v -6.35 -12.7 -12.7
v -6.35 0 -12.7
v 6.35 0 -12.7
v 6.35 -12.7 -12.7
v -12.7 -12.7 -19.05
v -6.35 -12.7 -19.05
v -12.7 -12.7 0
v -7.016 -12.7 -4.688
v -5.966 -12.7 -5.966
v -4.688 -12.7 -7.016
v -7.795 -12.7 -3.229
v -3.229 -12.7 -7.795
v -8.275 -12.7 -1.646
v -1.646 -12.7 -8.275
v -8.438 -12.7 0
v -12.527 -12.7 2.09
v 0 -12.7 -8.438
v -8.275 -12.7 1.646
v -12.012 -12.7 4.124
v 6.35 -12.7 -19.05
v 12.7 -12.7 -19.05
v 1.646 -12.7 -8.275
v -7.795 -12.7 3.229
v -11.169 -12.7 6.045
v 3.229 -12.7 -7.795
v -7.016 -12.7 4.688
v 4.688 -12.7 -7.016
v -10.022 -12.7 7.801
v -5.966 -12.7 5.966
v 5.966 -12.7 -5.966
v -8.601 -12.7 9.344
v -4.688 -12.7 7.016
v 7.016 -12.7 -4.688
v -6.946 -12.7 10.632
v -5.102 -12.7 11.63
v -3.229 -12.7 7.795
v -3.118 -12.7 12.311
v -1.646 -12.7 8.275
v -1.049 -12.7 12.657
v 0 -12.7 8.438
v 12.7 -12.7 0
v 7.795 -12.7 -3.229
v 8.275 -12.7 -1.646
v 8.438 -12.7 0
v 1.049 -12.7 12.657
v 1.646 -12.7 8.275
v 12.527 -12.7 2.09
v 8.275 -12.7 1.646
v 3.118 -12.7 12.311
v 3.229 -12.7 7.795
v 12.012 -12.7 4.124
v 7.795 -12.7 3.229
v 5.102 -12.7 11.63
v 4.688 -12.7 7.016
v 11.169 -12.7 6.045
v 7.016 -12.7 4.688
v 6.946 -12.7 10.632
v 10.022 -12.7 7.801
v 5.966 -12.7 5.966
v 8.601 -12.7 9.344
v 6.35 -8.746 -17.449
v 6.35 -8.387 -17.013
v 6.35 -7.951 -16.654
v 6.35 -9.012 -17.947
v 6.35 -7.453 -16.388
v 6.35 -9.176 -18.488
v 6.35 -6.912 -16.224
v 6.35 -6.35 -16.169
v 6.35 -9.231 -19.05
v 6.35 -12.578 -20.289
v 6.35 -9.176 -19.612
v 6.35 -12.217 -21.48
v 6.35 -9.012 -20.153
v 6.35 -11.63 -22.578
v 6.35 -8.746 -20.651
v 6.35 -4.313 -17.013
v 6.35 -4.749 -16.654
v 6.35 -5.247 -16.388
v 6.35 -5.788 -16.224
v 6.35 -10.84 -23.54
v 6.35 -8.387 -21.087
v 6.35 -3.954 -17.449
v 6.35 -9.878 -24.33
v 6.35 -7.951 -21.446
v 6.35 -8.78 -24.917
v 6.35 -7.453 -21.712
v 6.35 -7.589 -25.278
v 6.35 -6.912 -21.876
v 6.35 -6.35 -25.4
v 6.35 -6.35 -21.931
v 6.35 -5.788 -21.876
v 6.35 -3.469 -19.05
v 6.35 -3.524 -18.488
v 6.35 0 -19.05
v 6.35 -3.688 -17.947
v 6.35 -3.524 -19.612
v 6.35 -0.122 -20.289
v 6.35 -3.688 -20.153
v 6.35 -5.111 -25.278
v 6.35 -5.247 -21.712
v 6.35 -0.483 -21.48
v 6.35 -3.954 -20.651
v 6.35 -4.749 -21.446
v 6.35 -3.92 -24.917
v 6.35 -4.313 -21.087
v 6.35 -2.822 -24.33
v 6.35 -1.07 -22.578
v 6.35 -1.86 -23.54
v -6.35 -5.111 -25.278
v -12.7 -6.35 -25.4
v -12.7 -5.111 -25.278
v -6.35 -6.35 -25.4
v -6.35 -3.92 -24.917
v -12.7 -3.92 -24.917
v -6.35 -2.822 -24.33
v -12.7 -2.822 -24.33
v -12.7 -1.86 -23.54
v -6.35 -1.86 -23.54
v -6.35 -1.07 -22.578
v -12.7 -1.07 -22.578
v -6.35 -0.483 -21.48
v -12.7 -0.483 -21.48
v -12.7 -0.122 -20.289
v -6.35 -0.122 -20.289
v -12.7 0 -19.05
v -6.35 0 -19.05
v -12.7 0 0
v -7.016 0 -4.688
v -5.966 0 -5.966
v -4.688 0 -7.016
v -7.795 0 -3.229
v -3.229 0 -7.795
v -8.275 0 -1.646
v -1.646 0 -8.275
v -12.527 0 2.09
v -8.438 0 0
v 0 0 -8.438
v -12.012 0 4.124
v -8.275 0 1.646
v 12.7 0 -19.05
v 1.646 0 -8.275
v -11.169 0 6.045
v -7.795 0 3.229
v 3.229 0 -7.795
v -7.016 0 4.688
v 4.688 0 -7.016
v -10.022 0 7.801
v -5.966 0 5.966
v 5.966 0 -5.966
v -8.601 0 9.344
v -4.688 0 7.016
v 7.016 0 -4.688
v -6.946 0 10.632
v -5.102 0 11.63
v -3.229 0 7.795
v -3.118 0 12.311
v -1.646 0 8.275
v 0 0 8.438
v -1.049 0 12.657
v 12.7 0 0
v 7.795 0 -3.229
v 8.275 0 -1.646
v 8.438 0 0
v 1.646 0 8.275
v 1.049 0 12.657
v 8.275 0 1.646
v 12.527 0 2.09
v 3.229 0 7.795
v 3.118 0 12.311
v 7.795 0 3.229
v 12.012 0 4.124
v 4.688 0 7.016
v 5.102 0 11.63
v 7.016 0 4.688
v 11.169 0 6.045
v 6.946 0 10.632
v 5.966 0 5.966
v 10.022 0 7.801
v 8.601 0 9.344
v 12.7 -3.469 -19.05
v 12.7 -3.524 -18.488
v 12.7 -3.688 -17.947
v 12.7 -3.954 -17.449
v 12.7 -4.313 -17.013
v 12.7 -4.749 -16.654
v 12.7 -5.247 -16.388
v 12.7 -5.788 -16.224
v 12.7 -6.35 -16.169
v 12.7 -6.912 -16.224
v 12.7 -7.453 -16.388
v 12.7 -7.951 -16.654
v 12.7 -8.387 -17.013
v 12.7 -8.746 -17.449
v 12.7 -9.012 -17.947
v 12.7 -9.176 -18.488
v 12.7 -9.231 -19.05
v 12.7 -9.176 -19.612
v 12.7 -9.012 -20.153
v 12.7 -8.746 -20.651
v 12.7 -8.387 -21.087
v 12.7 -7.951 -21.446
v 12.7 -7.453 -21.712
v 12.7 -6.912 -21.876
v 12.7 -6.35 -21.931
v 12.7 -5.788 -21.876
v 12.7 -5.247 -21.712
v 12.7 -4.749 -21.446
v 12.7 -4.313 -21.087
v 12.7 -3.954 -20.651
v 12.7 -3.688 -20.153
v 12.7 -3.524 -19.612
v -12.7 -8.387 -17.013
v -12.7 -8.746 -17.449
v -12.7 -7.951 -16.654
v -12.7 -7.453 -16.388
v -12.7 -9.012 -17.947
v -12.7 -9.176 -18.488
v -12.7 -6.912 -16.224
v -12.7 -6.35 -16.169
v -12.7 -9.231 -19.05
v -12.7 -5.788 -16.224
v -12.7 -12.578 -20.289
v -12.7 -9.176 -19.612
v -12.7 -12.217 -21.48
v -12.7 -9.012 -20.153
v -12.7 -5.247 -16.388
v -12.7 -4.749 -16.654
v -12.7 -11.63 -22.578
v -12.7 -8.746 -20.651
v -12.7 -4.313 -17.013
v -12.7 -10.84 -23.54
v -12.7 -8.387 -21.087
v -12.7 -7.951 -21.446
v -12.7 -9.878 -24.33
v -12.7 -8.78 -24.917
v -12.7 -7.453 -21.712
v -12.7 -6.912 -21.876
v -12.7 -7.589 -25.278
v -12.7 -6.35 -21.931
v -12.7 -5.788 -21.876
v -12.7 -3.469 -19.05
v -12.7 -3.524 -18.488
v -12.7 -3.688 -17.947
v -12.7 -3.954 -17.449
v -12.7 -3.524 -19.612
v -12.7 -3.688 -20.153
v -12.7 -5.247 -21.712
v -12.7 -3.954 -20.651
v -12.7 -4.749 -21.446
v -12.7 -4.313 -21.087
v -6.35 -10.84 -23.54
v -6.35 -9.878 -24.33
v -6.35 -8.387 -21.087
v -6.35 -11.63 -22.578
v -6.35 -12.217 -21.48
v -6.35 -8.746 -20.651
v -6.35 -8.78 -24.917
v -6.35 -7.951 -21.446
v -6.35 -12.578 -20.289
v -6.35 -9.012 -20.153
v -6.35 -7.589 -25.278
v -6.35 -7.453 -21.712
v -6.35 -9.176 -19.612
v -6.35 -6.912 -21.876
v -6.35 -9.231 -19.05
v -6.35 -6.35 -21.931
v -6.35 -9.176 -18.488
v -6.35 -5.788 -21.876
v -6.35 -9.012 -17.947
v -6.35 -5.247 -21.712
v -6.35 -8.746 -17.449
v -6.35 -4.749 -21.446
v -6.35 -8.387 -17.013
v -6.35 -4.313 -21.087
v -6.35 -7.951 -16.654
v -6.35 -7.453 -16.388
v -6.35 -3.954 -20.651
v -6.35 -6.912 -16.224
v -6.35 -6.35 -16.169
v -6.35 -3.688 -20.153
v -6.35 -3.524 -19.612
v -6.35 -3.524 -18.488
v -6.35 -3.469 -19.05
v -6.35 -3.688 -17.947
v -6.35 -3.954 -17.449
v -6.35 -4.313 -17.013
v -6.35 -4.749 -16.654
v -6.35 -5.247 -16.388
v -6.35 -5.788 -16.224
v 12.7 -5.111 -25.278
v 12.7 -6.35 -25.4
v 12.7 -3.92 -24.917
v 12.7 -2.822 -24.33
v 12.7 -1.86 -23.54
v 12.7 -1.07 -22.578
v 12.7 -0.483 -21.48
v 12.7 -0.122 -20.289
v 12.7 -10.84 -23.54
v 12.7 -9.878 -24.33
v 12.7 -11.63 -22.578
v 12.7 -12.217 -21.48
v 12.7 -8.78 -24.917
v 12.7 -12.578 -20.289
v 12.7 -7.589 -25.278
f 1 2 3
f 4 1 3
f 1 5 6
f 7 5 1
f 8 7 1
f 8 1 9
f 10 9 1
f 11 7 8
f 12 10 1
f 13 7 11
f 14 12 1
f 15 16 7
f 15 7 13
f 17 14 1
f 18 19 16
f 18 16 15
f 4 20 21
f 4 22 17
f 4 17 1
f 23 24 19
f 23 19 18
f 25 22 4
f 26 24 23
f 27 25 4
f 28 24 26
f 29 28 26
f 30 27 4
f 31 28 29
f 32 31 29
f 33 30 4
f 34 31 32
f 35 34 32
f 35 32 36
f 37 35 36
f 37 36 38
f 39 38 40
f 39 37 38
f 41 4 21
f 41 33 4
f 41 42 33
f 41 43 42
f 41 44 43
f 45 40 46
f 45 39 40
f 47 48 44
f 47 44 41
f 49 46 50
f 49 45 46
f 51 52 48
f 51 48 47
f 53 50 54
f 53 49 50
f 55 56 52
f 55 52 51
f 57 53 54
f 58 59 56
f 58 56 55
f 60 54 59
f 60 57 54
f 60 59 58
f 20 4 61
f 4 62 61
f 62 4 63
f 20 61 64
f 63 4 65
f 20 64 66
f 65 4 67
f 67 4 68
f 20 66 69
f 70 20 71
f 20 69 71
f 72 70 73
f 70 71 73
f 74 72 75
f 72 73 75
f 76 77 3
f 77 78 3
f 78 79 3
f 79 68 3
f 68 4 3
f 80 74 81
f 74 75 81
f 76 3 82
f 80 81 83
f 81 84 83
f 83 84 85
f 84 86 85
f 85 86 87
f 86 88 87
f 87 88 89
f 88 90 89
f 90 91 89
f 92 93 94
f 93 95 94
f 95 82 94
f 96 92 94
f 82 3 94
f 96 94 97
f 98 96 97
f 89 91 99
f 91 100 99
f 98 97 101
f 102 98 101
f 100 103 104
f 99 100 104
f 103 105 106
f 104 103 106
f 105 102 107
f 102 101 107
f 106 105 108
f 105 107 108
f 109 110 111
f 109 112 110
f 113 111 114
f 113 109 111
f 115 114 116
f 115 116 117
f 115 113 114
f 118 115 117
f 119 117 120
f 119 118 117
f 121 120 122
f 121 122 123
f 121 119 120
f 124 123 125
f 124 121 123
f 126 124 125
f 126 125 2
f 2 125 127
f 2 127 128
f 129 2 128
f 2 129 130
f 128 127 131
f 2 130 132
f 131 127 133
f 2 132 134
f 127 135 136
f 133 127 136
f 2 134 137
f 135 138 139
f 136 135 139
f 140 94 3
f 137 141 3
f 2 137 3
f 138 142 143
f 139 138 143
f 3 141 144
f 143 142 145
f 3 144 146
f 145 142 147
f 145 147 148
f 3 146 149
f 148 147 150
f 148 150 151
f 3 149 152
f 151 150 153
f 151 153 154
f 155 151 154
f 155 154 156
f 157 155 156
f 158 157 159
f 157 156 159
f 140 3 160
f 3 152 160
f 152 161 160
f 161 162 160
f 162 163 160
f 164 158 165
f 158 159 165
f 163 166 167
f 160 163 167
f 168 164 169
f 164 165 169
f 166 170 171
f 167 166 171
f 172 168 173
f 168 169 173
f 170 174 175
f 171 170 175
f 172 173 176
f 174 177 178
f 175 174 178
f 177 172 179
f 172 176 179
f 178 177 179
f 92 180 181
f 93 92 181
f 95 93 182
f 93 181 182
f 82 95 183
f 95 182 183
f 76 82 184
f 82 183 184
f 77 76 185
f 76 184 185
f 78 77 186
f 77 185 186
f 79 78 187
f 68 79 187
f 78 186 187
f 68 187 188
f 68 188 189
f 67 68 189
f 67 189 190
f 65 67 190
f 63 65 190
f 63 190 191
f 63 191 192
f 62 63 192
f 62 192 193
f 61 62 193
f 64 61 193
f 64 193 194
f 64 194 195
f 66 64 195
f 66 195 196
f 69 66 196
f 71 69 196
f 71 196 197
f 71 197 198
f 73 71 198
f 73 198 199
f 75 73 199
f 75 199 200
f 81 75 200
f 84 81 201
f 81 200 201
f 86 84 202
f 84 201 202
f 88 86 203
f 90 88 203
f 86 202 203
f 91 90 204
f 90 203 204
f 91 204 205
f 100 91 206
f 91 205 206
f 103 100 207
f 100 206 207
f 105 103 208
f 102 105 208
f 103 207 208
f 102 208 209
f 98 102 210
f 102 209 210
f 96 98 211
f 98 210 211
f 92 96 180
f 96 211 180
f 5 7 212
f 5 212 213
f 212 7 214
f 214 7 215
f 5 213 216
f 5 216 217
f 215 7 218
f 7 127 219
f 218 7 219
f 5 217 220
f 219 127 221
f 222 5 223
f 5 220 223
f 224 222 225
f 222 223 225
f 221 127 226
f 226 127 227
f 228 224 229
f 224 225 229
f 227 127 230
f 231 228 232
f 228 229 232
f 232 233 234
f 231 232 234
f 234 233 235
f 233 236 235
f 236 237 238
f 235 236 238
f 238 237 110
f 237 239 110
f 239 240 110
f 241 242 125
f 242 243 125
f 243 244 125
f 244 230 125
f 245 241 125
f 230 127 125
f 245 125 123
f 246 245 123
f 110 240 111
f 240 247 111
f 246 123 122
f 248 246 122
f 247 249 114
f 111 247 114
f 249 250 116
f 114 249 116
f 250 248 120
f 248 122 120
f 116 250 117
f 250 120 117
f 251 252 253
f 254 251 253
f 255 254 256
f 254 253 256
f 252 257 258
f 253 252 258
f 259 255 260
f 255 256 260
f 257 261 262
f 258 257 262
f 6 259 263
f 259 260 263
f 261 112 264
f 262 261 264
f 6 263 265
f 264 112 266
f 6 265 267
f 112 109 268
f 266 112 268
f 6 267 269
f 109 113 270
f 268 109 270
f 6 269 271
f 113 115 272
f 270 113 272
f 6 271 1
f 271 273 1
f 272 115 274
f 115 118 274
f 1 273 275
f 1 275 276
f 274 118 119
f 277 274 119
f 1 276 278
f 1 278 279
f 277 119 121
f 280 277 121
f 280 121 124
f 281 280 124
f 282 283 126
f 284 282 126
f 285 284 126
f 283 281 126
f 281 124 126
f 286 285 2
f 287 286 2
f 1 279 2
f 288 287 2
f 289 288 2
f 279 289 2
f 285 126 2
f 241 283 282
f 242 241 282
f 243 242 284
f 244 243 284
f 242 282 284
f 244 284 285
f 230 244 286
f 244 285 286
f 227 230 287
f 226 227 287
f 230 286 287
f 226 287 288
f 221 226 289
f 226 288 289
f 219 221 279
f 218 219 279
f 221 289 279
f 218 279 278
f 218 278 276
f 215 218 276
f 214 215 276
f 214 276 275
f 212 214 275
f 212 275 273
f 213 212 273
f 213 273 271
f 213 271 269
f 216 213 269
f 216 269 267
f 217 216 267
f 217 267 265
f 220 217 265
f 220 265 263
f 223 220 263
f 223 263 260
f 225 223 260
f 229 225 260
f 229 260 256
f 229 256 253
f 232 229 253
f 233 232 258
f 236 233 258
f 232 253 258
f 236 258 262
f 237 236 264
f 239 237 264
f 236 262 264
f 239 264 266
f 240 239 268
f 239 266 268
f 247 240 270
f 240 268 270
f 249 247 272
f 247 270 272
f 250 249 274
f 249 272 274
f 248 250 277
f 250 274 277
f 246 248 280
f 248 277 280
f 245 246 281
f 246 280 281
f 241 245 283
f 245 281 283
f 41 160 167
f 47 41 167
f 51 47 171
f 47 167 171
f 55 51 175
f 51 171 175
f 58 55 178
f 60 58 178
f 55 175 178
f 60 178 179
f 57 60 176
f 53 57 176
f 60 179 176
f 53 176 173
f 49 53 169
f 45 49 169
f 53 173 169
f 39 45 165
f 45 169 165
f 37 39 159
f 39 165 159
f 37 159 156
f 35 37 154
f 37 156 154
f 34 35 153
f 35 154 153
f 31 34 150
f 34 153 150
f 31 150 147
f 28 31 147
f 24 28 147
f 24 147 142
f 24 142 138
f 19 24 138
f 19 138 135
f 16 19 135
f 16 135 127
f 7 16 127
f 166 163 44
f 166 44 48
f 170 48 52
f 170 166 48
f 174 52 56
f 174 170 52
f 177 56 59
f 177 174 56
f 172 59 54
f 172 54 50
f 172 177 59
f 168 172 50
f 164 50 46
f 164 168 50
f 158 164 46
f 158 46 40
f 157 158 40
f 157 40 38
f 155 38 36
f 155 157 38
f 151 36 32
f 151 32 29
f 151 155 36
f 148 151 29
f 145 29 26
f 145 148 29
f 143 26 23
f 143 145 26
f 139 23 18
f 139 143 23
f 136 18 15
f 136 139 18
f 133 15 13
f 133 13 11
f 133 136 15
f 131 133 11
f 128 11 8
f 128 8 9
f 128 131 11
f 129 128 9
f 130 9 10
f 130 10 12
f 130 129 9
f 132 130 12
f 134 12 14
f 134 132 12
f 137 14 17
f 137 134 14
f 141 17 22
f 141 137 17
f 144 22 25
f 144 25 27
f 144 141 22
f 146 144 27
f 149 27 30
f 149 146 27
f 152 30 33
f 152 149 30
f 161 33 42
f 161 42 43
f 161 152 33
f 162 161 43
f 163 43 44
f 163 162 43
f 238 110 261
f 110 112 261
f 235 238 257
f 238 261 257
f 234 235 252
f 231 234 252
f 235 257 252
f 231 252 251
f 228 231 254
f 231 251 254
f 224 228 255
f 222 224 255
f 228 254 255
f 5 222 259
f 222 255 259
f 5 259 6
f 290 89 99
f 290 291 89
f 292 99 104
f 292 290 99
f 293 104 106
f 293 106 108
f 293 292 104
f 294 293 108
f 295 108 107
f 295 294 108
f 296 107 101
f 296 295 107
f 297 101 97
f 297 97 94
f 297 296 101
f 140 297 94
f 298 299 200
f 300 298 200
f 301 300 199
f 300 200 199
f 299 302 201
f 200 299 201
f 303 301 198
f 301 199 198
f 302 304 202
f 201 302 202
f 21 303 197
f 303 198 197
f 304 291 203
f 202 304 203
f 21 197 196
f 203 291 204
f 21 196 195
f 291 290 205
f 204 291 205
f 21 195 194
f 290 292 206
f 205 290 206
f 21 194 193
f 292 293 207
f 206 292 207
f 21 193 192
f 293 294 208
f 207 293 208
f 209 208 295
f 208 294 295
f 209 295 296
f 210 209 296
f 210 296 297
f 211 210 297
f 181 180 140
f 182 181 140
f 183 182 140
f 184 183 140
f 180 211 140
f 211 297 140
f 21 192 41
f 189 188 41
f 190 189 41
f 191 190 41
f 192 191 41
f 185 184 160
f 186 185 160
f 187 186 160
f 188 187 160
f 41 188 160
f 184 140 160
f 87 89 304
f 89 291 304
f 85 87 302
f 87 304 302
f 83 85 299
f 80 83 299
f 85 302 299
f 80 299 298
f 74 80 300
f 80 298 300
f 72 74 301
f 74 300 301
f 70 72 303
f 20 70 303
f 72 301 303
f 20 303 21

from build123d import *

# Parameters (mm, degrees)
F0_R     = 8.4375
F1_DEPTH = 12.7
F2_R     = 6.34999
F3_R     = 2.88125
F4_DEPTH = 25.401


# Not quite as in the source:
# - a fillet or chamfer is up to 0.001 mm smaller than in the source, because OpenCascade refuses the exact size


with BuildPart() as f1:
    # F0 (on Front) → F1 (new body)
    with BuildSketch(Plane.XZ):
        with BuildLine():
            ThreePointArc((0, -12.7), (-8.9802561211, -8.9802561211), (-12.7, 0))
            Line((-12.7, 0), (-12.7, -25.4))
            Line((-12.7, -25.4), (-6.35, -25.4))
            Line((-6.35, -25.4), (-6.35, -12.7))
            Line((-6.35, -12.7), (0, -12.7))
        make_face()
        with BuildLine():
            Line((12.7, -25.4), (12.7, 0))
            ThreePointArc((12.7, 0), (8.9802561211, -8.9802561211), (0, -12.7))
            Line((0, -12.7), (6.35, -12.7))
            Line((6.35, -12.7), (6.35, -25.4))
            Line((6.35, -25.4), (12.7, -25.4))
        make_face()
        with BuildLine():
            ThreePointArc((0, -12.7), (8.9802561211, -8.9802561211), (12.7, 0))
            ThreePointArc((12.7, 0), (0, 12.7), (-12.7, 0))
            ThreePointArc((-12.7, 0), (-8.9802561211, -8.9802561211), (0, -12.7))
        make_face()
        Circle(F0_R, mode=Mode.SUBTRACT)
    extrude(amount=F1_DEPTH)

    # F2 (radius 6.35 in the source; OpenCascade refuses exactly that, so slightly less here)
    f2_edges = [f1.edges().sort_by_distance(p)[0] for p in [
        (-9.525, -12.7, -25.4),
        (-9.525, 0, -25.4),
        (9.525, -12.7, -25.4),
        (9.525, 0, -25.4),
    ]]
    fillet(f2_edges, radius=F2_R)

    # F3 (on face) → F4 (cut, through all)
    with BuildSketch(Plane.YZ.offset(12.7)):
        with Locations((-6.35, -19.05)):
            Circle(F3_R)
    extrude(amount=-F4_DEPTH, mode=Mode.SUBTRACT)


solid = f1.part
